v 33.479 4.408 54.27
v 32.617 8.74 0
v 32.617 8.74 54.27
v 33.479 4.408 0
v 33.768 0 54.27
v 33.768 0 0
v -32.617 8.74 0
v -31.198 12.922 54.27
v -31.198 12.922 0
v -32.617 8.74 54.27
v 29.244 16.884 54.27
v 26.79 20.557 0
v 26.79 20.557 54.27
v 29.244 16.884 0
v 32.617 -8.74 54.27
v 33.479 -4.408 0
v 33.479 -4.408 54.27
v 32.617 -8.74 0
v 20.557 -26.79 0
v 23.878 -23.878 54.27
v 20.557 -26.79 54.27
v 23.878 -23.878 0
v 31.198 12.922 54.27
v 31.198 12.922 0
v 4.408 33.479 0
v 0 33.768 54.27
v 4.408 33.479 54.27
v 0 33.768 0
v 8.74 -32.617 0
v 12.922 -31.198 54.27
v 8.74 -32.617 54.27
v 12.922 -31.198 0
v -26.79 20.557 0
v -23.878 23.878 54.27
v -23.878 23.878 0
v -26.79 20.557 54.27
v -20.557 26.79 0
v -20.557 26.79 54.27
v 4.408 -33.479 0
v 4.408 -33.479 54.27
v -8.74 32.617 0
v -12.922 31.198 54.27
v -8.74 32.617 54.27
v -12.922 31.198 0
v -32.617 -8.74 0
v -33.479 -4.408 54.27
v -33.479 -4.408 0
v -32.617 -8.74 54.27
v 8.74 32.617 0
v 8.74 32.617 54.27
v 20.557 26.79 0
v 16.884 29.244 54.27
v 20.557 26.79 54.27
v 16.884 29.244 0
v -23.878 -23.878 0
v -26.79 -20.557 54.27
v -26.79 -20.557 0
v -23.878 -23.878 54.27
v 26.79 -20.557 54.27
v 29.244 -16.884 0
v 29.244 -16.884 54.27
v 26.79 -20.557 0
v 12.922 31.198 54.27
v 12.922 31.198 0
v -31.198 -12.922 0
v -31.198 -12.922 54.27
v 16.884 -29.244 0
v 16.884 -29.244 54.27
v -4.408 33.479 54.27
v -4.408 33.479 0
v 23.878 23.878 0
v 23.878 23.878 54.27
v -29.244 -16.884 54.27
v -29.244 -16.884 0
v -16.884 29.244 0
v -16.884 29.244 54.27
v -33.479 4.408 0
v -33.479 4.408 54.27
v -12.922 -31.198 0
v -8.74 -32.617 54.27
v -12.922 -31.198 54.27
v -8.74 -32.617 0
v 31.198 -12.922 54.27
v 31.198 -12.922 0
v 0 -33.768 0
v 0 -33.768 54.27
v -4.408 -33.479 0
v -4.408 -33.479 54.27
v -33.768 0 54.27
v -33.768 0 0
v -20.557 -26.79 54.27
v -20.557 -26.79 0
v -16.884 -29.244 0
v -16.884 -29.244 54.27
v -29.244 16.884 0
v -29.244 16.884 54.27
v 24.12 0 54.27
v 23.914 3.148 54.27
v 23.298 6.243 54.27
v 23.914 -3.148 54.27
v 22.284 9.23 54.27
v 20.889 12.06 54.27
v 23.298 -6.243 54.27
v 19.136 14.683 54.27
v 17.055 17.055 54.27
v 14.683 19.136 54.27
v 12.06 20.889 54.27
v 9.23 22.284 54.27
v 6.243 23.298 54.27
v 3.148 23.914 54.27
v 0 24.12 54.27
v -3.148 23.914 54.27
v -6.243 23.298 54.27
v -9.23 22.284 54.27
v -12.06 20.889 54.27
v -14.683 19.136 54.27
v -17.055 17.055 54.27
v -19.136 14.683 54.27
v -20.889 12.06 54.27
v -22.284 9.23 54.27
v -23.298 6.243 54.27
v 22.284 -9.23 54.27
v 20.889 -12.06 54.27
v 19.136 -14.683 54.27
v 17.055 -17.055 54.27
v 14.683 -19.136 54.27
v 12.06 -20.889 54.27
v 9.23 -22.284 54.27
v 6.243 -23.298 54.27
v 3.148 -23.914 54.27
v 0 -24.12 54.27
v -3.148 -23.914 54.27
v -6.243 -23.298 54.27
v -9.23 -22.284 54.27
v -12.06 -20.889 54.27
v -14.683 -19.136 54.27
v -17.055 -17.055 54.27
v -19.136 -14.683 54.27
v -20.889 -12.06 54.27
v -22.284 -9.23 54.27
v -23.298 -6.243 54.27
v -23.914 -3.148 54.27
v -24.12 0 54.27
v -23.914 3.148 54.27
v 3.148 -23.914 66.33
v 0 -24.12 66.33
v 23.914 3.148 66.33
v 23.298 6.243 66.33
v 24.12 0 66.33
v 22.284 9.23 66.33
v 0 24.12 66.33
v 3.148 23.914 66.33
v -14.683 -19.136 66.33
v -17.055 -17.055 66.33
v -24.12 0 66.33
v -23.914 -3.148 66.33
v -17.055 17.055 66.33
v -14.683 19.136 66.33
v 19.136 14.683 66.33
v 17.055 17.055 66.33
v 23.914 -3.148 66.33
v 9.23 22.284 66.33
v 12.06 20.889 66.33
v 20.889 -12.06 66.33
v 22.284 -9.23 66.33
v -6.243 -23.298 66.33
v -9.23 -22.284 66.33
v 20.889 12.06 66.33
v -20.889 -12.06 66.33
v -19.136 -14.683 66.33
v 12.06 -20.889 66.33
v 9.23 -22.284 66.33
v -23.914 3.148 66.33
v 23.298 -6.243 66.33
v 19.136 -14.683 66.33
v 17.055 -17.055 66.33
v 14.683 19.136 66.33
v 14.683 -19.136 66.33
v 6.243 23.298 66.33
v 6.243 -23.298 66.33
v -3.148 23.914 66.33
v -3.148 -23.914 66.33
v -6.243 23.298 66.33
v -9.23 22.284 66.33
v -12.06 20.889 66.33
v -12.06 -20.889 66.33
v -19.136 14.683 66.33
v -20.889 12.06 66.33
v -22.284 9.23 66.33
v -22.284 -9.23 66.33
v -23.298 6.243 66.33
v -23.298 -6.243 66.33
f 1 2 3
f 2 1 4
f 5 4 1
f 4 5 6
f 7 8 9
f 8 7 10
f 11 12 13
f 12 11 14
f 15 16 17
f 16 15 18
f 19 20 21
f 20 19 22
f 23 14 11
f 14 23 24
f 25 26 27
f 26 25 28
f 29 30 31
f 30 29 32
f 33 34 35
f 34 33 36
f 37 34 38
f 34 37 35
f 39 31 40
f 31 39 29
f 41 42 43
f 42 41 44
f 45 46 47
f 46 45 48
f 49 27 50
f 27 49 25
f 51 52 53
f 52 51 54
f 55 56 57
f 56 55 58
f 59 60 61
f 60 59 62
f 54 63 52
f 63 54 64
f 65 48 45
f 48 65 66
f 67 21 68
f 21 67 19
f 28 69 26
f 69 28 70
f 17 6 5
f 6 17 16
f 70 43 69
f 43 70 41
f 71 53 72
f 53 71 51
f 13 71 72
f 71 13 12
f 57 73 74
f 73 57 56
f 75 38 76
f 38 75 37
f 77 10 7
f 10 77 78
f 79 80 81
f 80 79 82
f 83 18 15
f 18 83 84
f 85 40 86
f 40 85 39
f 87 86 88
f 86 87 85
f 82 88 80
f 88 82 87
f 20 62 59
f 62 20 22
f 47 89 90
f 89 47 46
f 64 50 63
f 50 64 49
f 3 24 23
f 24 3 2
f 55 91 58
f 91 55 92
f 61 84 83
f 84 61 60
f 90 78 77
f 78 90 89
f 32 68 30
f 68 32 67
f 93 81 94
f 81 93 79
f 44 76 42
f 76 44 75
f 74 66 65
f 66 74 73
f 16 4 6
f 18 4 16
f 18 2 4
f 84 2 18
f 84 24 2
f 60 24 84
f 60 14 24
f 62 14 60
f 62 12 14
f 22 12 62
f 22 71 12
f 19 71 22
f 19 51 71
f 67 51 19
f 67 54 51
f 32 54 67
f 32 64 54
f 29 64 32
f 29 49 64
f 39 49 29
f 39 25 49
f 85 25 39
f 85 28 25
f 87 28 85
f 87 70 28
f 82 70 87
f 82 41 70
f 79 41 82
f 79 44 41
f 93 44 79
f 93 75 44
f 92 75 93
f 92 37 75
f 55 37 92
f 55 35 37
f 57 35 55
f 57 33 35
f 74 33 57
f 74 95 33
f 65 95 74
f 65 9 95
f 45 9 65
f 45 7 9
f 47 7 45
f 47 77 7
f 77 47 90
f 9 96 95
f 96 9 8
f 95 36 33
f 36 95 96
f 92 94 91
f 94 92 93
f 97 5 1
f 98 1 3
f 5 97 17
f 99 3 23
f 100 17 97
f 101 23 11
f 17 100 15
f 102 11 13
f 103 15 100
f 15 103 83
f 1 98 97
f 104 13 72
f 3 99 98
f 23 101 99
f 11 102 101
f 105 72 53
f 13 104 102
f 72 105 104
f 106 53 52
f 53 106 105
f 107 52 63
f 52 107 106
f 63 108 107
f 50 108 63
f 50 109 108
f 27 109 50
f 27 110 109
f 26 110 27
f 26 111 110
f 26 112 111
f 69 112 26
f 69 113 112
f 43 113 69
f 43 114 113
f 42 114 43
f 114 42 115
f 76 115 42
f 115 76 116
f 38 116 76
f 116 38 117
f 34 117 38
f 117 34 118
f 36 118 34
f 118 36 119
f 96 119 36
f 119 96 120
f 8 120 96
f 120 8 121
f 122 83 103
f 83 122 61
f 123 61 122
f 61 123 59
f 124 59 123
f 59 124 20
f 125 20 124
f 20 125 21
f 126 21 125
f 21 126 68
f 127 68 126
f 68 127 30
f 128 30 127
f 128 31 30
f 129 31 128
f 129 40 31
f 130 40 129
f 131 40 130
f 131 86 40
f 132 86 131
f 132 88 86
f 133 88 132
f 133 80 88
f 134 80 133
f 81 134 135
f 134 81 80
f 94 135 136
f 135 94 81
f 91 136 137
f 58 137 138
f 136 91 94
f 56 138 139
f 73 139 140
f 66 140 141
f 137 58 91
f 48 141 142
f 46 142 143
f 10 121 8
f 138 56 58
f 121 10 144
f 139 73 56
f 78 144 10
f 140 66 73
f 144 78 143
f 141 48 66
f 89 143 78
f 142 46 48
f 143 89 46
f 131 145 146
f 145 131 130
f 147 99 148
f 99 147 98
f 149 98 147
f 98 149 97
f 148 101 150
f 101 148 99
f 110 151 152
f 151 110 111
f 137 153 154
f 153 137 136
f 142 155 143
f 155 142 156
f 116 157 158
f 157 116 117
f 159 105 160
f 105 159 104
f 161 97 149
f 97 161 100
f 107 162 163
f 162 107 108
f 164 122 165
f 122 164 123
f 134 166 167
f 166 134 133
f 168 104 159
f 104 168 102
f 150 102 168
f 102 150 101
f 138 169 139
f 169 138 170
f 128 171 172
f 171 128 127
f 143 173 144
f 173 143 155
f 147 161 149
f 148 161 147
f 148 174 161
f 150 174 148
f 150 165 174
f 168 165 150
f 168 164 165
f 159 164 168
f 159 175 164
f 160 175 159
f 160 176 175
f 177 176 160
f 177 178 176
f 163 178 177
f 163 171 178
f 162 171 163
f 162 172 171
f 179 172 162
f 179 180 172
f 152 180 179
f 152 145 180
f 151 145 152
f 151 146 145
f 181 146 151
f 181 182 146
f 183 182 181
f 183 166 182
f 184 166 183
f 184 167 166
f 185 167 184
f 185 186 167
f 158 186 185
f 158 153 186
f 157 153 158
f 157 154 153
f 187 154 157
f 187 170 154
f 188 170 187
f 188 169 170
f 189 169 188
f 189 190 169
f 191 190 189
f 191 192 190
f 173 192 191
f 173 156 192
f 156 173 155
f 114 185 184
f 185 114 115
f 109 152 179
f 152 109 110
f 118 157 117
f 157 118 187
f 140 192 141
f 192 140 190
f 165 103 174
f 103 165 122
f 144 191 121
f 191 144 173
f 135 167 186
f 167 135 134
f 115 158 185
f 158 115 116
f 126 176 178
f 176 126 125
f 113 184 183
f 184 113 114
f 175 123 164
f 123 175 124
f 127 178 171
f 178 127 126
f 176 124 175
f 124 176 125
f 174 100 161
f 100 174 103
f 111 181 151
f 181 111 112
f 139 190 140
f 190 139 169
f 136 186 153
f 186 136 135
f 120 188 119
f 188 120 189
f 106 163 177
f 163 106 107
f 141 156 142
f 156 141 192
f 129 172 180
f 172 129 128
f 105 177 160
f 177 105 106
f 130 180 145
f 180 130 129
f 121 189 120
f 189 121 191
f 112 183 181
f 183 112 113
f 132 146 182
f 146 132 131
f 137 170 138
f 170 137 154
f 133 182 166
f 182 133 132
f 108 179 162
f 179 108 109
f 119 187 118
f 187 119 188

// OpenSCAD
// Auto-generated by scripts/author_from_manifest.py (Phase D.3).
// Source: data/phase_d_manifest.json (sku_intent='anvil-cap-threaded-2in').
// Do not hand-edit — regenerate from the manifest.
//
// @part anvil_cap_threaded_2in
// @kind fitting
// @category fitting.cap
// @display-name "Anvil FIG 1 Threaded Cap 2\""
// @mfg anvil_international
// @mfg-pn FIG_1_2in
// @listing UL FM
// @price-usd 10.50
// @install-minutes 6
// @crew journeyman
// @param size_in number default=2 label="Size" unit="in"
// @port inlet position=[-0.05,0,0] direction=[-1,0,0] style=grooved size_in=2 role=run_a
// @port outlet position=[0.05,0,0] direction=[1,0,0] style=grooved size_in=2 role=run_b

size_in = 2.0;

function od_mm(nps) =
    nps ==   1  ? 33.4 :
    nps == 1.25 ? 42.2 :
    nps == 1.5  ? 48.3 :
    nps ==   2  ? 60.3 :
    nps == 2.5  ? 73.0 :
    nps ==   3  ? 88.9 :
    nps ==   4  ? 114.3 :
    nps ==   5  ? 141.3 :
    nps ==   6  ? 168.3 : 60.3;

od = od_mm(size_in);
h  = od * 0.9;

union() {
    cylinder(h = h, d = od * 1.12, $fn = 48);
    translate([0, 0, h])
        cylinder(h = od * 0.2, d = od * 0.8, $fn = 48);
}
